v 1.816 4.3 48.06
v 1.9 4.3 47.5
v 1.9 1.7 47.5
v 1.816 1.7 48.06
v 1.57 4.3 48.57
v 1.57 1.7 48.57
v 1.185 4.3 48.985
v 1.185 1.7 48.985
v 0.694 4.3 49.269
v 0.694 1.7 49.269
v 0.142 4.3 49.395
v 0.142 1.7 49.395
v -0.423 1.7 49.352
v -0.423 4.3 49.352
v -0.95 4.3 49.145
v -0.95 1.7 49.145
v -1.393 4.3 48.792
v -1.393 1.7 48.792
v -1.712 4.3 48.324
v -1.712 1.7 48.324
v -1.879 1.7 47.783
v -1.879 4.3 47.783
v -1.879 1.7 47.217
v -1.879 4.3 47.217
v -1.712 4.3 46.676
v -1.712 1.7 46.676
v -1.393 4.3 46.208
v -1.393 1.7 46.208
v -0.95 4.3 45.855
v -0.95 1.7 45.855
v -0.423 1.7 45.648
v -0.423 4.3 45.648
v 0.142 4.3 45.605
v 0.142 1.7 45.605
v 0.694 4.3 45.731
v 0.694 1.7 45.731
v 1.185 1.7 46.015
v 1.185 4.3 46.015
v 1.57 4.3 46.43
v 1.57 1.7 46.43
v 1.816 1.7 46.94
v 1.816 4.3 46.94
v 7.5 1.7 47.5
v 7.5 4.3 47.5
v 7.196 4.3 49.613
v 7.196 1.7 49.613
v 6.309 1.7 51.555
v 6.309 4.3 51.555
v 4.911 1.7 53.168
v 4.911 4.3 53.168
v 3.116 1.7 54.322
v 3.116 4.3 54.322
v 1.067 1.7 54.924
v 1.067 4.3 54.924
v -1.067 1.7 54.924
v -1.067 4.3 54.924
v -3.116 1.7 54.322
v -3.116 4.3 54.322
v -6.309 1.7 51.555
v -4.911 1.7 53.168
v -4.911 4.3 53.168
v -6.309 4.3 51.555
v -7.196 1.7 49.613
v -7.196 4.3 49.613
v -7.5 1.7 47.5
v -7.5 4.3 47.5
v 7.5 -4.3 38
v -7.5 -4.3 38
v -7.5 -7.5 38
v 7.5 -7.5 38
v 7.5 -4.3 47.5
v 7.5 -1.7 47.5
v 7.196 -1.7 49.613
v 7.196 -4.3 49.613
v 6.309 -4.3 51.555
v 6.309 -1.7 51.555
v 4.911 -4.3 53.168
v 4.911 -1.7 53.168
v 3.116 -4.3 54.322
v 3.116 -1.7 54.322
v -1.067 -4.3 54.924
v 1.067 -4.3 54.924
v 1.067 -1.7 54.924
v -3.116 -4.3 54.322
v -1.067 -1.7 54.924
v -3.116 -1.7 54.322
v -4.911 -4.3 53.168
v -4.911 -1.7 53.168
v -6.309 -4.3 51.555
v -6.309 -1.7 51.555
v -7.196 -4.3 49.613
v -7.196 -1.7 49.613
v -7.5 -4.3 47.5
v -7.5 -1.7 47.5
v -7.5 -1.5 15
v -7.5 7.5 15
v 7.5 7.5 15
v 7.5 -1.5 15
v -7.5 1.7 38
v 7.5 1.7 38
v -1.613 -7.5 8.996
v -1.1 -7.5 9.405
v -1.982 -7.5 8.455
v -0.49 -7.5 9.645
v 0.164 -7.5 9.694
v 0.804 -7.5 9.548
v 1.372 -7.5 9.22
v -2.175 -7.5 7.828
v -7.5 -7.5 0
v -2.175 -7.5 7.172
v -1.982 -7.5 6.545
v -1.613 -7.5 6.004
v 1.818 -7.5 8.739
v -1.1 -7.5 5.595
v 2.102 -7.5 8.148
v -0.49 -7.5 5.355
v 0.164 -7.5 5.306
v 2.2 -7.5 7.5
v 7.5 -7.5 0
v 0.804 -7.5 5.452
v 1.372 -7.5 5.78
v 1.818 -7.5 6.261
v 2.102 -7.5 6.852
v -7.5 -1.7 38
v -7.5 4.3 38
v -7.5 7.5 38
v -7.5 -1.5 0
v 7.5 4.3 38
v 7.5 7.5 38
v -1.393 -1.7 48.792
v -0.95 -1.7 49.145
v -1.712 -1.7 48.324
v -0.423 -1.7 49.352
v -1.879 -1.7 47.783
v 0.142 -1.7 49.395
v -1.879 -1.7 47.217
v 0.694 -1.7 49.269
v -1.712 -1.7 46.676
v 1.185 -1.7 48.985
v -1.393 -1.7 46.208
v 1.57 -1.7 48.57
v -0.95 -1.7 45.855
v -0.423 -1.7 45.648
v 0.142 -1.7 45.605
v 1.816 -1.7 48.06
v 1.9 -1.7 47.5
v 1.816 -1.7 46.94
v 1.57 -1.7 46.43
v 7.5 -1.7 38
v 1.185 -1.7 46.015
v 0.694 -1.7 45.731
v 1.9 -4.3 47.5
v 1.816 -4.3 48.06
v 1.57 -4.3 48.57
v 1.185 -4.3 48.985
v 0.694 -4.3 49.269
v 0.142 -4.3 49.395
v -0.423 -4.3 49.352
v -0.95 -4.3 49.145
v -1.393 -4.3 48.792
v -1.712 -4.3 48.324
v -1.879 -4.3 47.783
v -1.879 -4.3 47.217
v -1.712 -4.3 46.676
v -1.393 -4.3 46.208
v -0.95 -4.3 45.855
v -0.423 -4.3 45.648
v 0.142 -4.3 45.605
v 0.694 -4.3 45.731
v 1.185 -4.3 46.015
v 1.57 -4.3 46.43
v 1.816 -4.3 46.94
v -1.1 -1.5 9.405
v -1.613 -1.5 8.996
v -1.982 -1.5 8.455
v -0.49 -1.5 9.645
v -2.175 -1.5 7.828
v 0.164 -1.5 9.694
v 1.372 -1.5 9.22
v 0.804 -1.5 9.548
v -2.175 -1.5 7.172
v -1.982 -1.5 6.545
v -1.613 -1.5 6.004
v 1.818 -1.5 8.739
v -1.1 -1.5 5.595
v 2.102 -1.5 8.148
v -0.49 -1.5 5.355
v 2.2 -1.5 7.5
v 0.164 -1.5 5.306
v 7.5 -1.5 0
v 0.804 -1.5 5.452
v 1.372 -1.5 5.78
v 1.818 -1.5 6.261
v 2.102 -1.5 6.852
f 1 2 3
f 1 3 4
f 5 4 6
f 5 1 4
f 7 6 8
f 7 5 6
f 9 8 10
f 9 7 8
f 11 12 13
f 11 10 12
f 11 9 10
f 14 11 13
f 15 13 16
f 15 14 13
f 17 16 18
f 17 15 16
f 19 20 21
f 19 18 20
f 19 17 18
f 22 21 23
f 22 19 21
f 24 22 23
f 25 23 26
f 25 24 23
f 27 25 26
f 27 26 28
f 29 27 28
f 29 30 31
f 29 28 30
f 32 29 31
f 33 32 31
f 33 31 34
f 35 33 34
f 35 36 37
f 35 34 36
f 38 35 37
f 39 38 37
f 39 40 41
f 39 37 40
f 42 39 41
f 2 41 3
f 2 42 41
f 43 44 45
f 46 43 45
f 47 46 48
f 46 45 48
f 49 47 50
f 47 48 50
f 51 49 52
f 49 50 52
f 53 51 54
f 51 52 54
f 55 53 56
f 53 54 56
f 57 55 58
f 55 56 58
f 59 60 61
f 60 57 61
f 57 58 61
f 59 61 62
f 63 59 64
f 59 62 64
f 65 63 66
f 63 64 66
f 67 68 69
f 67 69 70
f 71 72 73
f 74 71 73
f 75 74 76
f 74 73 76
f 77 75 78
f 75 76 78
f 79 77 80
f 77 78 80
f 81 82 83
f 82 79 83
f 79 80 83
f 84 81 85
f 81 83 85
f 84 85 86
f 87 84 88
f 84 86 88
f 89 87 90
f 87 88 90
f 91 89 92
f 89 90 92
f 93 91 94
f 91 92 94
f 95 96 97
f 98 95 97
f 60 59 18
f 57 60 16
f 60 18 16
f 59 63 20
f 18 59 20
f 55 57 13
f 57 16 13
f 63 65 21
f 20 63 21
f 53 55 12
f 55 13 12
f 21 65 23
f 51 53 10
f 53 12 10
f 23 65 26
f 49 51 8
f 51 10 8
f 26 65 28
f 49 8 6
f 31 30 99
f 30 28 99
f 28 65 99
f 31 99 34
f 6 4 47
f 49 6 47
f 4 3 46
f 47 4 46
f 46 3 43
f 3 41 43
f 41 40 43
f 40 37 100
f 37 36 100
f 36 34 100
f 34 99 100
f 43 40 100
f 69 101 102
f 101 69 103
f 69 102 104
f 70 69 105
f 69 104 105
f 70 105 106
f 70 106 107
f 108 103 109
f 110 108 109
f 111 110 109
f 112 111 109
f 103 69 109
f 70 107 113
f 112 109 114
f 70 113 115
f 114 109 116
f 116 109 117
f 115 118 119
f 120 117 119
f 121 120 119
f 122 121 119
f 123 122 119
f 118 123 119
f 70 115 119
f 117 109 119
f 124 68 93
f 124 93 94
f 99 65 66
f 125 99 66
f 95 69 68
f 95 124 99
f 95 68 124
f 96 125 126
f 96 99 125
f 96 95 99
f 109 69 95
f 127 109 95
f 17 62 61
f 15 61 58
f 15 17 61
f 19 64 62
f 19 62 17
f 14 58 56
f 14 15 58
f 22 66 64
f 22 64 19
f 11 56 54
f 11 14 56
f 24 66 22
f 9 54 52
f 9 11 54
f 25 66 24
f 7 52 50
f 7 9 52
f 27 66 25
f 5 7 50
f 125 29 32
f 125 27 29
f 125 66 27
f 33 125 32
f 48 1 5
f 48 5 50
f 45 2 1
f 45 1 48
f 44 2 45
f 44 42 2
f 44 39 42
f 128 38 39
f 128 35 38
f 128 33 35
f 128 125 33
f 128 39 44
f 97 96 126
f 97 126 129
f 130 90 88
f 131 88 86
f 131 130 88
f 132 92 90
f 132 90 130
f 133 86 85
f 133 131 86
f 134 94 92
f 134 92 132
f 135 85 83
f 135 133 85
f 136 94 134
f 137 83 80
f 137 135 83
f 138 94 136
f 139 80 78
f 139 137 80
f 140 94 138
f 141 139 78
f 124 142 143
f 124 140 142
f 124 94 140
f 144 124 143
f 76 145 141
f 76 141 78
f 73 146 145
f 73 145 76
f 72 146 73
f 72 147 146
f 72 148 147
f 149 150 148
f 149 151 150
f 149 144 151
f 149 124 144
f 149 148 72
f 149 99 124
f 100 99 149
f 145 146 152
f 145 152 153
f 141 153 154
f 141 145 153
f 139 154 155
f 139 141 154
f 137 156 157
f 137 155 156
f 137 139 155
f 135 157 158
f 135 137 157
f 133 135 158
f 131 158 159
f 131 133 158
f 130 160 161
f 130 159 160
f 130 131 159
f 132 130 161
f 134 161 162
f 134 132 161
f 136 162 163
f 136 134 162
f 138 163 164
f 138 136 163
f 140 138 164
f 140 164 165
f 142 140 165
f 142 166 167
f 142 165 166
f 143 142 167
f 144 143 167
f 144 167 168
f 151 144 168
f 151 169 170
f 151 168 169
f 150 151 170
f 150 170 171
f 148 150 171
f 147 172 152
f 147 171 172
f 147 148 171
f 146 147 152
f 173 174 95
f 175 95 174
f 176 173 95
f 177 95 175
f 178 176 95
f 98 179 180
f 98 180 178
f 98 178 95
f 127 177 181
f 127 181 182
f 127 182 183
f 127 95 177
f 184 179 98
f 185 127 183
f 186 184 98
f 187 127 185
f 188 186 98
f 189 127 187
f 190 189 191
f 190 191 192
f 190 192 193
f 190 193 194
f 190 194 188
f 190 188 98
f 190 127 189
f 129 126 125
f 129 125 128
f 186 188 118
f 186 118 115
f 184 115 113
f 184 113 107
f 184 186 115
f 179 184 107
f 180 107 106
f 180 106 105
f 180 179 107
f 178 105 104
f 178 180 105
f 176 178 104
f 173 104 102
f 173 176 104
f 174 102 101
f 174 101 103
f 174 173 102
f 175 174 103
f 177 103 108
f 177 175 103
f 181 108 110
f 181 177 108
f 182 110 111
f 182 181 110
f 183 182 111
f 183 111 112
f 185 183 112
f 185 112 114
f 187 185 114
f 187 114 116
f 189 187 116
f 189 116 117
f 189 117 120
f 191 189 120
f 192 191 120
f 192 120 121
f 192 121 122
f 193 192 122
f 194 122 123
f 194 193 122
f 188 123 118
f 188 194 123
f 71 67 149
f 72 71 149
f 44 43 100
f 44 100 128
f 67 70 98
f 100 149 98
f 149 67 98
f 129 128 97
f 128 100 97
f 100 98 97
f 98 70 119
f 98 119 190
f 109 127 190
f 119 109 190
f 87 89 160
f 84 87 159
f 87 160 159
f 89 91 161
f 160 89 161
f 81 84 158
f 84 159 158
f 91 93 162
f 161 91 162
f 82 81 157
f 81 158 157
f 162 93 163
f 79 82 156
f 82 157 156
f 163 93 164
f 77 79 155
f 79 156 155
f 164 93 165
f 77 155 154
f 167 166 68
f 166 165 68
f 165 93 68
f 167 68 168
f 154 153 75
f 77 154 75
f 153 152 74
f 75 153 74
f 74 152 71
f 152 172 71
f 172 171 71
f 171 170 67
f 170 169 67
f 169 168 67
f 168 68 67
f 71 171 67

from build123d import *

# Parameters (mm, degrees)
CYLINDER005_R     = 2.2
CYLINDER005_DEPTH = 6
BOX008_W          = 15
BOX008_H          = 6
BOX008_DEPTH      = 15
CYLINDER004_R     = 1.9
CYLINDER004_DEPTH = 15
BOX005_W          = 15
BOX005_H          = 3.4
BOX005_DEPTH      = 17
ARRAY001_Y_COUNT  = 3
ARRAY001_Y_PITCH  = 6
CYLINDER003_R     = 7.5
CYLINDER003_DEPTH = 15
BOX004_W          = 15
BOX004_H          = 15
BOX004_DEPTH      = 12.5
BOX009_W          = 15
BOX009_H          = 15
BOX009_DEPTH      = 20


with BuildPart() as insert_hole001:
    # Cylinder005 → Cylinder005 (new body)
    with BuildSketch(Plane(origin=(0, -1.5, 7.5), x_dir=(1, 0, 0), z_dir=(0, -1, 0))):
        Circle(CYLINDER005_R)
    extrude(amount=CYLINDER005_DEPTH)


with BuildPart() as one_cube_with_insert_hole_cut:
    # Box008 → Box008 (new body)
    with BuildSketch(Plane(origin=(-7.5, -7.5, 0), x_dir=(1, 0, 0), z_dir=(0, 0, 1))):
        with Locations((7.5, 3)):
            Rectangle(BOX008_W, BOX008_H)
    extrude(amount=BOX008_DEPTH)

    # Cut004: cut insert hole001
    add(insert_hole001.part, mode=Mode.SUBTRACT)


with BuildPart() as side_2_bolt_hole:
    # Cylinder004 → Cylinder004 (new body)
    with BuildSketch(Plane(origin=(0, 7.5, 12.5), x_dir=(1, 0, 0), z_dir=(0, -1, 0))):
        Circle(CYLINDER004_R)
    extrude(amount=CYLINDER004_DEPTH)


with BuildPart() as side_2_extract_fusion:
    # Box005 → Box005 (new body)
    with BuildSketch(Plane(origin=(-7.5, -7.7, 3), x_dir=(1, 0, 0), z_dir=(0, 0, 1))):
        with Locations((7.5, 1.7)):
            Rectangle(BOX005_W, BOX005_H)
    extrude(amount=BOX005_DEPTH)

    # Array001 Y: side 2 extract fusion ×3


with BuildPart() as side_2_extract_fusion_1:
    add(side_2_extract_fusion.part)
    with Locations(*[(0, i * ARRAY001_Y_PITCH, 0) for i in range(1, ARRAY001_Y_COUNT)]):
        add(side_2_extract_fusion.part)

    # Fusion004: union side 2 bolt hole
    add(side_2_bolt_hole.part)


with BuildPart() as outer_cylinder001:
    # Cylinder003 → Cylinder003 (new body)
    with BuildSketch(Plane(origin=(0, 7.5, 12.5), x_dir=(1, 0, 0), z_dir=(0, -1, 0))):
        Circle(CYLINDER003_R)
    extrude(amount=CYLINDER003_DEPTH)


with BuildPart() as side_2_cut_clone001:
    # Box004 → Box004 (new body)
    with BuildSketch(Plane(origin=(-7.5, -7.5, 0), x_dir=(1, 0, 0), z_dir=(0, 0, 1))):
        with Locations((7.5, 7.5)):
            Rectangle(BOX004_W, BOX004_H)
    extrude(amount=BOX004_DEPTH)

    # Fusion003: union outer cylinder001
    add(outer_cylinder001.part)

    # Cut001: cut side 2 extract fusion
    add(side_2_extract_fusion_1.part, mode=Mode.SUBTRACT)


with BuildPart() as side_2_cut_clone001_1:
    # Body004 placement: moved
    add(side_2_cut_clone001.part.moved(Location((0, 0, 35))))


with BuildPart() as side_2_one_fusion00:
    # Box009 → Box009 (new body)
    with BuildSketch(Plane(origin=(-7.5, -7.5, 15), x_dir=(1, 0, 0), z_dir=(0, 0, 1))):
        with Locations((7.5, 7.5)):
            Rectangle(BOX009_W, BOX009_H)
    extrude(amount=BOX009_DEPTH)

    # Fusion006: union one cube with insert hole cut, side 2 cut clone001
    add(one_cube_with_insert_hole_cut.part)
    add(side_2_cut_clone001_1.part)


solid = side_2_one_fusion00.part
